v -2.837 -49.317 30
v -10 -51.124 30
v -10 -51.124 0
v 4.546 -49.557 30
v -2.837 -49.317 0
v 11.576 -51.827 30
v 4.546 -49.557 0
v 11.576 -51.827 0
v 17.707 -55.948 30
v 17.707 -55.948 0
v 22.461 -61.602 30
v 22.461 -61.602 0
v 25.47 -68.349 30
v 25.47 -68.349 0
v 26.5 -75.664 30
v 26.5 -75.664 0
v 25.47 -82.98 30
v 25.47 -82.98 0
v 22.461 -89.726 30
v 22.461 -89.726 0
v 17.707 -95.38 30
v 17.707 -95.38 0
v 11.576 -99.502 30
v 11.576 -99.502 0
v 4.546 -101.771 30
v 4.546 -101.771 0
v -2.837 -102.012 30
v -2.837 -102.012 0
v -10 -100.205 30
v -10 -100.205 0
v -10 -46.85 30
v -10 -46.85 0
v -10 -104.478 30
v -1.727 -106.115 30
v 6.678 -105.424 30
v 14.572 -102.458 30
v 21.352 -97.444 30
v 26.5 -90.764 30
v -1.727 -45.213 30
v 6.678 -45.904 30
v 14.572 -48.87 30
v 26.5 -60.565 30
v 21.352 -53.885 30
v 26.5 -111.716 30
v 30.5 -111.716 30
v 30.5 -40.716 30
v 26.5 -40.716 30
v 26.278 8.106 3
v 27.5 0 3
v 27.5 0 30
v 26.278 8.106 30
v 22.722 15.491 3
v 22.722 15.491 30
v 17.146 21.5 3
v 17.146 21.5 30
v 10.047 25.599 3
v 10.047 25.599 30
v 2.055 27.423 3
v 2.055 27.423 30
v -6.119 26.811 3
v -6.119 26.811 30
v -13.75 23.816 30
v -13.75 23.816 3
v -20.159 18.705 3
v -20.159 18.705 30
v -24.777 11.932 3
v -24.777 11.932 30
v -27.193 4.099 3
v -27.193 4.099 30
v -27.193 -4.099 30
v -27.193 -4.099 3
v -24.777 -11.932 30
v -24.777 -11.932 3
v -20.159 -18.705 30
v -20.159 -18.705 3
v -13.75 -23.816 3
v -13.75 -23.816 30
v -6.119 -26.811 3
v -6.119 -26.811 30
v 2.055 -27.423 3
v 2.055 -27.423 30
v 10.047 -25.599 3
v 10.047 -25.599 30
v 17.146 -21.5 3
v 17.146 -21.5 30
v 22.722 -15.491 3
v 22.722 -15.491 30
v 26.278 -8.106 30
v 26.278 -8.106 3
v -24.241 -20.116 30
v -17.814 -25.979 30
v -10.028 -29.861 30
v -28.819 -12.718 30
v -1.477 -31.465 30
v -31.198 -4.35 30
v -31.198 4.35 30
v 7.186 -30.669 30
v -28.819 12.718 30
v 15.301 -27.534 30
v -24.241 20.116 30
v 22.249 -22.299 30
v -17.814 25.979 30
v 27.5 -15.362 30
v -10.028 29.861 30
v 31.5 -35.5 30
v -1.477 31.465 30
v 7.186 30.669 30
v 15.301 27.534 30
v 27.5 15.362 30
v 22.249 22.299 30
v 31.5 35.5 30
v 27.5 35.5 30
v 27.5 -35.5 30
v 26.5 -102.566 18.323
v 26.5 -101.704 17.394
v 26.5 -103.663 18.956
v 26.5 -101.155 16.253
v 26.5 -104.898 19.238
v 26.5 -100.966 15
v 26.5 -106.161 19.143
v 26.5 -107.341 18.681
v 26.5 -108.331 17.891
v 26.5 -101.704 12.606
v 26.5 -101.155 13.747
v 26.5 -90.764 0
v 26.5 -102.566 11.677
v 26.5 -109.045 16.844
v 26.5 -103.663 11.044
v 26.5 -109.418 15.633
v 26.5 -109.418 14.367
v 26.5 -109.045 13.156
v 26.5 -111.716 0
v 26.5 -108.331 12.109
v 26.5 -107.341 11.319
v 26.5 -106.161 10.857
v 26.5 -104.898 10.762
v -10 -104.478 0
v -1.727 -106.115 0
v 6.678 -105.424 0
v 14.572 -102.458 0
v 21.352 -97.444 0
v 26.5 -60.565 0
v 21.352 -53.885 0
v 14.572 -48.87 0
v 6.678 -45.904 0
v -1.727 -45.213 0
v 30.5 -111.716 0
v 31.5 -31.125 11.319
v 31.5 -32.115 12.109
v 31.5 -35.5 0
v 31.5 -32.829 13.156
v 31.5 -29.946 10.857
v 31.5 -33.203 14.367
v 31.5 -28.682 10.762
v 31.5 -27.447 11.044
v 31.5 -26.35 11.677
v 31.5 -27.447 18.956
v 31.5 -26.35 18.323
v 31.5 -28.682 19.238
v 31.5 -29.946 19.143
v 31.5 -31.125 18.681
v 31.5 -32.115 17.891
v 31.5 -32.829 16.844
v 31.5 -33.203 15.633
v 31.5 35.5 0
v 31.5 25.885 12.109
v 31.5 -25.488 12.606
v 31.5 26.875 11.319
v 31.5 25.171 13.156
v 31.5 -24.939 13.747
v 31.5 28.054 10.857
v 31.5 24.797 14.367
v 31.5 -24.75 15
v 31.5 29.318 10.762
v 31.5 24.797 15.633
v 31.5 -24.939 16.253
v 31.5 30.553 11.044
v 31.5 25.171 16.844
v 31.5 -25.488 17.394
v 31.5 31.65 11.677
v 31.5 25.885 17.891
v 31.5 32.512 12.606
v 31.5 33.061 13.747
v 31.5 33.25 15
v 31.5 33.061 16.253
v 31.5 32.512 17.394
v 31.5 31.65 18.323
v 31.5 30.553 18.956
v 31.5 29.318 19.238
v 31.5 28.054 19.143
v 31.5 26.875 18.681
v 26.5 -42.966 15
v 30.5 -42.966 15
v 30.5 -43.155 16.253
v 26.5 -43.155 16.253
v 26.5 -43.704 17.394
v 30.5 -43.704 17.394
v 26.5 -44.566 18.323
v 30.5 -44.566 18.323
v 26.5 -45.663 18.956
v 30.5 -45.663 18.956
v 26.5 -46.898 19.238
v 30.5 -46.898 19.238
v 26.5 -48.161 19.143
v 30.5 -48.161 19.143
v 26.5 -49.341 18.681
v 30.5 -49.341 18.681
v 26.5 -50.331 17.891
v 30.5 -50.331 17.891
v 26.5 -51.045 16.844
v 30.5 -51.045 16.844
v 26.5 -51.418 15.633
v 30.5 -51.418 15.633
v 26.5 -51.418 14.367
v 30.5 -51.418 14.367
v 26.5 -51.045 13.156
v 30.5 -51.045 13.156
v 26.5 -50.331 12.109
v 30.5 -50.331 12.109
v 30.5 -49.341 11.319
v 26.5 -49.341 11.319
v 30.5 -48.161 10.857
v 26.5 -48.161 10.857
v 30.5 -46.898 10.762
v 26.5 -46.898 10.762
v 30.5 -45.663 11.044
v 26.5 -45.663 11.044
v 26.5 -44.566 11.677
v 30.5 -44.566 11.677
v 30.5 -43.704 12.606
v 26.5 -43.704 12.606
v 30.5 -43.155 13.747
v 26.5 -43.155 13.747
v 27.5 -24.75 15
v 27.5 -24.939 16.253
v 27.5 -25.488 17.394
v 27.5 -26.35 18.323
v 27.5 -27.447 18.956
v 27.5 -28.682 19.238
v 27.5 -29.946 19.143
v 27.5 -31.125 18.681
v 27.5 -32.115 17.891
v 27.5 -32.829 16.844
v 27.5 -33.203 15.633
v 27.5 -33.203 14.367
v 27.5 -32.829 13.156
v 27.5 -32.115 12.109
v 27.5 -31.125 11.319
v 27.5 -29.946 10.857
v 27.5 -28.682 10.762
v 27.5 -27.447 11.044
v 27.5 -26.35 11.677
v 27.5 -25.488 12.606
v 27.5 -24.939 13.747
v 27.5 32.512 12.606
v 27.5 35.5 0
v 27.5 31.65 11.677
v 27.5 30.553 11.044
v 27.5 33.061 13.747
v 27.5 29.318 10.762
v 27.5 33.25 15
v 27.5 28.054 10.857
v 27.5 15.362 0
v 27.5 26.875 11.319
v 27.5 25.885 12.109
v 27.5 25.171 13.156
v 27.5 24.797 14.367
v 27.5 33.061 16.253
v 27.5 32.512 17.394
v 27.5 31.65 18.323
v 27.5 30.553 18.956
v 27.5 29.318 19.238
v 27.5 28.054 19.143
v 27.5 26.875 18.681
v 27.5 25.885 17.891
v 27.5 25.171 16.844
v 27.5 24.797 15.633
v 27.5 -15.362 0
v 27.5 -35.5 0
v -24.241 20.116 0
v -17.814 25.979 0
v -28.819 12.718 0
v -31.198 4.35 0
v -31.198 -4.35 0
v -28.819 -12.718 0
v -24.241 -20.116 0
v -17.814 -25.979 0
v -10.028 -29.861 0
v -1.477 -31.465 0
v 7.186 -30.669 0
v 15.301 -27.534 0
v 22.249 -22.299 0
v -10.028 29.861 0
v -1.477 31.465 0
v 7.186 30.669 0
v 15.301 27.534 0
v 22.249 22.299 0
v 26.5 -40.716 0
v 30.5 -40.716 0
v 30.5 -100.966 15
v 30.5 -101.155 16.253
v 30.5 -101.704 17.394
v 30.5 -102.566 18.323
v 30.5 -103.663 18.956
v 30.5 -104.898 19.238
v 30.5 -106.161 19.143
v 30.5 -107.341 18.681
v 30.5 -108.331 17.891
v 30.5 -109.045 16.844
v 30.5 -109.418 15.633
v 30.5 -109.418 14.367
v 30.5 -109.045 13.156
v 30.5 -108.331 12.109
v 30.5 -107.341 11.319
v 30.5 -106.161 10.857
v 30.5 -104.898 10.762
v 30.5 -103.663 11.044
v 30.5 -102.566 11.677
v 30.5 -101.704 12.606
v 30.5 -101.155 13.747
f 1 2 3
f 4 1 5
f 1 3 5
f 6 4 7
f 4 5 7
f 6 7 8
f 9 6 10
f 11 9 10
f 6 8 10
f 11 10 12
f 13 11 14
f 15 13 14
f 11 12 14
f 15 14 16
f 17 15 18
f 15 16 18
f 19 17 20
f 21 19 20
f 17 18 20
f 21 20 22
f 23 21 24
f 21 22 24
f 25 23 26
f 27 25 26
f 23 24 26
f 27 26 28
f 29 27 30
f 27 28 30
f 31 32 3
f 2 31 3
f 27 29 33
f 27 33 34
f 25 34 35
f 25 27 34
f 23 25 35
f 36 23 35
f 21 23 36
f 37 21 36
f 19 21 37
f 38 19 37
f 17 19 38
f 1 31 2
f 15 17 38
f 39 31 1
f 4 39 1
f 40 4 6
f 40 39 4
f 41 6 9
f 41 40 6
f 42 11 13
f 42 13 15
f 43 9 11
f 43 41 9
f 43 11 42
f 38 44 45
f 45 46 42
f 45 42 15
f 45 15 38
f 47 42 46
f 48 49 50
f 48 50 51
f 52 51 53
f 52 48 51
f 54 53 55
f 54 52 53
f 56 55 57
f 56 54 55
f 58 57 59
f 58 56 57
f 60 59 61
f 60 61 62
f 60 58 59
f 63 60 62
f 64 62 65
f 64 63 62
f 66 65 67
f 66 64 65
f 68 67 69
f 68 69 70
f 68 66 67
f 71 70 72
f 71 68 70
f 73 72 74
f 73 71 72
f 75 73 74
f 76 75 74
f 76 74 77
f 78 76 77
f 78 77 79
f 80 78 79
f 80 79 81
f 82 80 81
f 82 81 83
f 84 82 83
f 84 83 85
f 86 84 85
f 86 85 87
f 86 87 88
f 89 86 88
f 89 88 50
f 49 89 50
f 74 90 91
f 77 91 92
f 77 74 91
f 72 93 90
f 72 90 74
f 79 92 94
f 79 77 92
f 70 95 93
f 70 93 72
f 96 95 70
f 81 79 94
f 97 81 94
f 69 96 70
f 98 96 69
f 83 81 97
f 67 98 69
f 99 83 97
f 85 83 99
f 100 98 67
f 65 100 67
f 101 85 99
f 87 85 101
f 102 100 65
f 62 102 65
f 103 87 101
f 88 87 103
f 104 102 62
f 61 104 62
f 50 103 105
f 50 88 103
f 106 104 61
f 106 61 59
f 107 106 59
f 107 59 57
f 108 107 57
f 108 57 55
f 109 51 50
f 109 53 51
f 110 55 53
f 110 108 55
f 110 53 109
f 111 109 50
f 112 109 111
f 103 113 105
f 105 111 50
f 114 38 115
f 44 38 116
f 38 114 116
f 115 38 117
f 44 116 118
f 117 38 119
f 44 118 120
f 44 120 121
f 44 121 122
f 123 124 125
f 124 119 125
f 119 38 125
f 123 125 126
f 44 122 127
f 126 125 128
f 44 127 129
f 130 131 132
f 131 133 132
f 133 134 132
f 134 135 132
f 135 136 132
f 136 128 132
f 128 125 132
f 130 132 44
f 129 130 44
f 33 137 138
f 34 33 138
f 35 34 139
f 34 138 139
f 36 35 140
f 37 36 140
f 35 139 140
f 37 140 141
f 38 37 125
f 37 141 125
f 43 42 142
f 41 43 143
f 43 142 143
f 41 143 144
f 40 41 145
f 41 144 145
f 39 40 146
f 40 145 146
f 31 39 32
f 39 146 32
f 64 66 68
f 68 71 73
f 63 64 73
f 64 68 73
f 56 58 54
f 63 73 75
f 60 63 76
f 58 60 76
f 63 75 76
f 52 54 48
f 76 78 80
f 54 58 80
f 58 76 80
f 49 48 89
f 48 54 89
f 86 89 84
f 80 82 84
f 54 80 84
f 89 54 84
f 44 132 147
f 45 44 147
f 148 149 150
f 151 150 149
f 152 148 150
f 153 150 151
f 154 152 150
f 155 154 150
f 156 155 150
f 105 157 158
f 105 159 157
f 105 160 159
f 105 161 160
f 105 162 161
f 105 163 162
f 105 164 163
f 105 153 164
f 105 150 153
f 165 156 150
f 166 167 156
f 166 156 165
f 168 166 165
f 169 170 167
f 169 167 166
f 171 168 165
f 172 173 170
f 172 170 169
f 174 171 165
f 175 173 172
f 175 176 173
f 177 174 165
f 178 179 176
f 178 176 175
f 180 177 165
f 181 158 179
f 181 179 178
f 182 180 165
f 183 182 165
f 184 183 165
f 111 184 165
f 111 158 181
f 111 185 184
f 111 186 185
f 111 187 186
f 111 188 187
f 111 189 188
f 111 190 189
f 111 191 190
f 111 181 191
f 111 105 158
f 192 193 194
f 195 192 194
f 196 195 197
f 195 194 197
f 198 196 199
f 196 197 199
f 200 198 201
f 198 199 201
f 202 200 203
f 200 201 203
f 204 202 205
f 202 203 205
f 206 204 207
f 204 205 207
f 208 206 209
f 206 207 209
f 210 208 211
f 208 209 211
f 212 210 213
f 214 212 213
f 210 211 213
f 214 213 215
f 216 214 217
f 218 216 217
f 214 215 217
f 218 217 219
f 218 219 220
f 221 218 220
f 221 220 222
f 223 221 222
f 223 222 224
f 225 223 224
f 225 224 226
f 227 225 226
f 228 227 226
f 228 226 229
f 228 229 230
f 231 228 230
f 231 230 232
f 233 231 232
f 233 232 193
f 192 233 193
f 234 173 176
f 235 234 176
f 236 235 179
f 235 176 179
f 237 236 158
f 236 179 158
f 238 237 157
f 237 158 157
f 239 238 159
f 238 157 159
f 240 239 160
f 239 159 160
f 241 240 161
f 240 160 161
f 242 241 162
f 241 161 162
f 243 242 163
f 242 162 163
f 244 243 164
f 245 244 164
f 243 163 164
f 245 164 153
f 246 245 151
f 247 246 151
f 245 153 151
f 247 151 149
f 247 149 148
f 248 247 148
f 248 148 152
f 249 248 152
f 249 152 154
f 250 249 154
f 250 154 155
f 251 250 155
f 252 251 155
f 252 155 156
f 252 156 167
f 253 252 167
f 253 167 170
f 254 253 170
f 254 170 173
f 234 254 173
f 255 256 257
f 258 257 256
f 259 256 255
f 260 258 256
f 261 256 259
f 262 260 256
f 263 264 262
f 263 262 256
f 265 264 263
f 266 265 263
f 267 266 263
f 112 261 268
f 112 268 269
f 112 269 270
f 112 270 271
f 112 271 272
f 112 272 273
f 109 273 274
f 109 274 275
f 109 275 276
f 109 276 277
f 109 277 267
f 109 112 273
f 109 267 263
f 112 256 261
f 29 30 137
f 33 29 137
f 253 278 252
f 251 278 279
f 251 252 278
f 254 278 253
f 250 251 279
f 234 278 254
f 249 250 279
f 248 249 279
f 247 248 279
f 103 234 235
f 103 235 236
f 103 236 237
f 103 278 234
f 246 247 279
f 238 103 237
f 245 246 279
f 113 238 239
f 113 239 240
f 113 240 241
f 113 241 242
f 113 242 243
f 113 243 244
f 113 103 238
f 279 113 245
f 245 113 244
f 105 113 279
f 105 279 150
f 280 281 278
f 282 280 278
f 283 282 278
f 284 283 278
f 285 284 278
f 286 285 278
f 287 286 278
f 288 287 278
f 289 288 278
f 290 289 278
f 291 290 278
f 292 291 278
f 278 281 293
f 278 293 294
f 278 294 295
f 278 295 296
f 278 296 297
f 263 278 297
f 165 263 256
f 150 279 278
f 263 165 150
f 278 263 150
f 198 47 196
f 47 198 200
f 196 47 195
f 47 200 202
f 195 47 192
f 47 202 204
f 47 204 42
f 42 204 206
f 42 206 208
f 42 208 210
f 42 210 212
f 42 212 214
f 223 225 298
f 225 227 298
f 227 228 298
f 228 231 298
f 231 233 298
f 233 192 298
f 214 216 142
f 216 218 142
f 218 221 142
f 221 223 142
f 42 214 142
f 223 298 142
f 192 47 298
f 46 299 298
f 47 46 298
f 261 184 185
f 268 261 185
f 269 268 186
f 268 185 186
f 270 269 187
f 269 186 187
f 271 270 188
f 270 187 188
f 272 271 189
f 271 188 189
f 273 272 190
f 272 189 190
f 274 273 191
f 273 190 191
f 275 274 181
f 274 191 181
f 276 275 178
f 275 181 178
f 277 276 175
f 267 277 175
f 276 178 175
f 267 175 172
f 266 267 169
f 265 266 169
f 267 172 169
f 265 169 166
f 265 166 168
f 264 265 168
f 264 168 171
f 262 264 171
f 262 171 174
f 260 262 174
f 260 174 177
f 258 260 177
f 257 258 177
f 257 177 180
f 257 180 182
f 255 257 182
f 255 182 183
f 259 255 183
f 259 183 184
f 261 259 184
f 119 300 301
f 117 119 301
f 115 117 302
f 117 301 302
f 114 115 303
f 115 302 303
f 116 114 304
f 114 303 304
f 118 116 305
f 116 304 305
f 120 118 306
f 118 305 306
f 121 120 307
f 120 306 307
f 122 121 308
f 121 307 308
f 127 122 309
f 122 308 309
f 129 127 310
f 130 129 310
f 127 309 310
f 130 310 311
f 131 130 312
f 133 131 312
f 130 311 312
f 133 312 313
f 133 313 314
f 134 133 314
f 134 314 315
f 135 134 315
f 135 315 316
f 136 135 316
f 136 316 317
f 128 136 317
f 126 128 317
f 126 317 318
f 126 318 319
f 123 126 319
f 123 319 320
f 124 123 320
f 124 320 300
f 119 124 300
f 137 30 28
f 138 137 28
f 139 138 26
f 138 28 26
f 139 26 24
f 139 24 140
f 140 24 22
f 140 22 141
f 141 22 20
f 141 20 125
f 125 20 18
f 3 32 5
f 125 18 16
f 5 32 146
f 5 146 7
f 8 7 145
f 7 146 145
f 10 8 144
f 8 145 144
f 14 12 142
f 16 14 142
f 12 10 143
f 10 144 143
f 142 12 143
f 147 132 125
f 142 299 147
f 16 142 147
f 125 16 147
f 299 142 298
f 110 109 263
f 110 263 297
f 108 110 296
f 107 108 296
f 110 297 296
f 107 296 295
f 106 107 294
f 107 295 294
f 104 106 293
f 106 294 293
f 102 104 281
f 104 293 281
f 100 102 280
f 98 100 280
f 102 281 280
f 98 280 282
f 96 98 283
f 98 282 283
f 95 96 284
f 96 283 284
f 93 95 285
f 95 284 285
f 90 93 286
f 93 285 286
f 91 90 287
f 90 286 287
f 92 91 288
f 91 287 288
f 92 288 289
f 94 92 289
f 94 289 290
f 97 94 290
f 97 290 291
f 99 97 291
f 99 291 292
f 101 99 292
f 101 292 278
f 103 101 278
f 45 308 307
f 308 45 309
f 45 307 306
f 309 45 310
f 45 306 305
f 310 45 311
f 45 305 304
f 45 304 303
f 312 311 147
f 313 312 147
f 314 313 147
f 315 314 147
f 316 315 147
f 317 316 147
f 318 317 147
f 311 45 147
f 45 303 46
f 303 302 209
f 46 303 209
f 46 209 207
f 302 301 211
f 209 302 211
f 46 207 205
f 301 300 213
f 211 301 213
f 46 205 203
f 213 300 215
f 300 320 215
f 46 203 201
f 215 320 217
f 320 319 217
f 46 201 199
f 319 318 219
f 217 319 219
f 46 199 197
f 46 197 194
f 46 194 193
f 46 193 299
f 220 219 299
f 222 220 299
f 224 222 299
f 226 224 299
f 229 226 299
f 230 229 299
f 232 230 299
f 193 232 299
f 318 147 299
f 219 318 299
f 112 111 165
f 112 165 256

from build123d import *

# Parameters (mm, degrees)
F0_R      = 31.5
F0_R_2    = 27.5
F1_DEPTH  = 30
F2_R      = 31.5
F2_R_2    = 27.5
F3_DEPTH  = 3
F5_DEPTH  = 30
F6_R      = 4.25
F7_DEPTH  = 5
F9_DEPTH  = 30
F10_R     = 4.25
F11_DEPTH = 5


# Not quite as in the source:
# - a feature names something its author has since deleted; it is built from what else it names


with BuildPart() as f1:
    # F0 (on Top) → F1 (new body)
    with BuildSketch(Plane.XY):
        Circle(F0_R)
        Circle(F0_R_2, mode=Mode.SUBTRACT)
    extrude(amount=F1_DEPTH)

    # F2 (on face) → F3 (join)
    with BuildSketch(Plane(origin=(0, 0, 0), x_dir=(1, 0, 0), z_dir=(0, 0, -1))):
        Circle(F2_R)
        Circle(F2_R_2, mode=Mode.SUBTRACT)
        Circle(F2_R_2)
    extrude(amount=-F3_DEPTH)

    # F4 (on face) → F5 (join)
    with BuildSketch(Plane.XY.offset(30)):
        with BuildLine():
            Line((27.5, 35.5), (27.5, 15.3622914957))
            ThreePointArc((27.5, 15.3622914957), (30.4836021494, 7.9372539332), (31.5, 0))
            Line((31.5, 0), (31.5, 35.5))
            Line((31.5, 35.5), (27.5, 35.5))
        make_face()
        with BuildLine():
            ThreePointArc((31.5, 0), (30.4836021494, -7.9372539332), (27.5, -15.3622914957))
            Line((27.5, -15.3622914957), (27.5, -35.5))
            Line((27.5, -35.5), (31.5, -35.5))
            Line((31.5, -35.5), (31.5, 0))
        make_face()
    extrude(amount=-F5_DEPTH)

    # F6 (on face) → F7 (cut)
    with BuildSketch(Plane.YZ.offset(31.5)):
        with Locations((29, 15)):
            Circle(F6_R)
        with Locations((-29, 15)):
            Circle(F6_R)
    extrude(amount=-F7_DEPTH, mode=Mode.SUBTRACT)


with BuildPart() as f9:
    # F8 (on Top) → F9 (new body)
    with BuildSketch(Plane.XY):
        with BuildLine():
            Line((26.5, -76.2157712579), (26.5, -75.6643489003))
            ThreePointArc((26.5, -75.6643489003), (14.7859730826, -97.6558245216), (-10, -100.2051312839))
            Line((-10, -100.2051312839), (-10, -104.4784079688))
            ThreePointArc((-10, -104.4784079688), (10.7277036045, -104.2154675365), (26.5, -90.7640177709))
            Line((26.5, -90.7640177709), (26.5, -76.2157712579))
        make_face()
        with BuildLine():
            Line((26.5, -60.5646800298), (26.5, -75.6643489003))
            Line((26.5, -75.6643489003), (26.5, -76.2157712579))
            Line((26.5, -76.2157712579), (26.5, -90.7640177709))
            ThreePointArc((26.5, -90.7640177709), (29.4830459756, -83.4745985762), (30.5, -75.6643489003))
            ThreePointArc((30.5, -75.6643489003), (29.4830459756, -67.8540992244), (26.5, -60.5646800298))
        make_face()
        with BuildLine():
            ThreePointArc((-10, -51.1235665167), (14.7859730826, -53.6728732791), (26.5, -75.6643489003))
            Line((26.5, -75.6643489003), (26.5, -60.5646800298))
            ThreePointArc((26.5, -60.5646800298), (10.7277036045, -47.1132302642), (-10, -46.8502898319))
            Line((-10, -46.8502898319), (-10, -51.1235665167))
        make_face()
        with BuildLine():
            Line((26.5, -40.7157712579), (26.5, -60.5646800298))
            ThreePointArc((26.5, -60.5646800298), (29.4830459756, -67.8540992244), (30.5, -75.6643489003))
            Line((30.5, -75.6643489003), (30.5, -40.7157712579))
            Line((30.5, -40.7157712579), (26.5, -40.7157712579))
        make_face()
        with BuildLine():
            ThreePointArc((30.5, -75.6643489003), (29.4830459756, -83.4745985762), (26.5, -90.7640177709))
            Line((26.5, -90.7640177709), (26.5, -111.7157712579))
            Line((26.5, -111.7157712579), (30.5, -111.7157712579))
            Line((30.5, -111.7157712579), (30.5, -75.6643489003))
        make_face()
    extrude(amount=F9_DEPTH)

    # F10 (on face) → F11 (cut)
    with BuildSketch(Plane.YZ.offset(30.5)):
        with Locations((-105.2157712579, 15)):
            Circle(F10_R)
        with Locations((-47.2157712579, 15)):
            Circle(F10_R)
    extrude(amount=-F11_DEPTH, mode=Mode.SUBTRACT)


solid = Compound([f1.part, f9.part])
